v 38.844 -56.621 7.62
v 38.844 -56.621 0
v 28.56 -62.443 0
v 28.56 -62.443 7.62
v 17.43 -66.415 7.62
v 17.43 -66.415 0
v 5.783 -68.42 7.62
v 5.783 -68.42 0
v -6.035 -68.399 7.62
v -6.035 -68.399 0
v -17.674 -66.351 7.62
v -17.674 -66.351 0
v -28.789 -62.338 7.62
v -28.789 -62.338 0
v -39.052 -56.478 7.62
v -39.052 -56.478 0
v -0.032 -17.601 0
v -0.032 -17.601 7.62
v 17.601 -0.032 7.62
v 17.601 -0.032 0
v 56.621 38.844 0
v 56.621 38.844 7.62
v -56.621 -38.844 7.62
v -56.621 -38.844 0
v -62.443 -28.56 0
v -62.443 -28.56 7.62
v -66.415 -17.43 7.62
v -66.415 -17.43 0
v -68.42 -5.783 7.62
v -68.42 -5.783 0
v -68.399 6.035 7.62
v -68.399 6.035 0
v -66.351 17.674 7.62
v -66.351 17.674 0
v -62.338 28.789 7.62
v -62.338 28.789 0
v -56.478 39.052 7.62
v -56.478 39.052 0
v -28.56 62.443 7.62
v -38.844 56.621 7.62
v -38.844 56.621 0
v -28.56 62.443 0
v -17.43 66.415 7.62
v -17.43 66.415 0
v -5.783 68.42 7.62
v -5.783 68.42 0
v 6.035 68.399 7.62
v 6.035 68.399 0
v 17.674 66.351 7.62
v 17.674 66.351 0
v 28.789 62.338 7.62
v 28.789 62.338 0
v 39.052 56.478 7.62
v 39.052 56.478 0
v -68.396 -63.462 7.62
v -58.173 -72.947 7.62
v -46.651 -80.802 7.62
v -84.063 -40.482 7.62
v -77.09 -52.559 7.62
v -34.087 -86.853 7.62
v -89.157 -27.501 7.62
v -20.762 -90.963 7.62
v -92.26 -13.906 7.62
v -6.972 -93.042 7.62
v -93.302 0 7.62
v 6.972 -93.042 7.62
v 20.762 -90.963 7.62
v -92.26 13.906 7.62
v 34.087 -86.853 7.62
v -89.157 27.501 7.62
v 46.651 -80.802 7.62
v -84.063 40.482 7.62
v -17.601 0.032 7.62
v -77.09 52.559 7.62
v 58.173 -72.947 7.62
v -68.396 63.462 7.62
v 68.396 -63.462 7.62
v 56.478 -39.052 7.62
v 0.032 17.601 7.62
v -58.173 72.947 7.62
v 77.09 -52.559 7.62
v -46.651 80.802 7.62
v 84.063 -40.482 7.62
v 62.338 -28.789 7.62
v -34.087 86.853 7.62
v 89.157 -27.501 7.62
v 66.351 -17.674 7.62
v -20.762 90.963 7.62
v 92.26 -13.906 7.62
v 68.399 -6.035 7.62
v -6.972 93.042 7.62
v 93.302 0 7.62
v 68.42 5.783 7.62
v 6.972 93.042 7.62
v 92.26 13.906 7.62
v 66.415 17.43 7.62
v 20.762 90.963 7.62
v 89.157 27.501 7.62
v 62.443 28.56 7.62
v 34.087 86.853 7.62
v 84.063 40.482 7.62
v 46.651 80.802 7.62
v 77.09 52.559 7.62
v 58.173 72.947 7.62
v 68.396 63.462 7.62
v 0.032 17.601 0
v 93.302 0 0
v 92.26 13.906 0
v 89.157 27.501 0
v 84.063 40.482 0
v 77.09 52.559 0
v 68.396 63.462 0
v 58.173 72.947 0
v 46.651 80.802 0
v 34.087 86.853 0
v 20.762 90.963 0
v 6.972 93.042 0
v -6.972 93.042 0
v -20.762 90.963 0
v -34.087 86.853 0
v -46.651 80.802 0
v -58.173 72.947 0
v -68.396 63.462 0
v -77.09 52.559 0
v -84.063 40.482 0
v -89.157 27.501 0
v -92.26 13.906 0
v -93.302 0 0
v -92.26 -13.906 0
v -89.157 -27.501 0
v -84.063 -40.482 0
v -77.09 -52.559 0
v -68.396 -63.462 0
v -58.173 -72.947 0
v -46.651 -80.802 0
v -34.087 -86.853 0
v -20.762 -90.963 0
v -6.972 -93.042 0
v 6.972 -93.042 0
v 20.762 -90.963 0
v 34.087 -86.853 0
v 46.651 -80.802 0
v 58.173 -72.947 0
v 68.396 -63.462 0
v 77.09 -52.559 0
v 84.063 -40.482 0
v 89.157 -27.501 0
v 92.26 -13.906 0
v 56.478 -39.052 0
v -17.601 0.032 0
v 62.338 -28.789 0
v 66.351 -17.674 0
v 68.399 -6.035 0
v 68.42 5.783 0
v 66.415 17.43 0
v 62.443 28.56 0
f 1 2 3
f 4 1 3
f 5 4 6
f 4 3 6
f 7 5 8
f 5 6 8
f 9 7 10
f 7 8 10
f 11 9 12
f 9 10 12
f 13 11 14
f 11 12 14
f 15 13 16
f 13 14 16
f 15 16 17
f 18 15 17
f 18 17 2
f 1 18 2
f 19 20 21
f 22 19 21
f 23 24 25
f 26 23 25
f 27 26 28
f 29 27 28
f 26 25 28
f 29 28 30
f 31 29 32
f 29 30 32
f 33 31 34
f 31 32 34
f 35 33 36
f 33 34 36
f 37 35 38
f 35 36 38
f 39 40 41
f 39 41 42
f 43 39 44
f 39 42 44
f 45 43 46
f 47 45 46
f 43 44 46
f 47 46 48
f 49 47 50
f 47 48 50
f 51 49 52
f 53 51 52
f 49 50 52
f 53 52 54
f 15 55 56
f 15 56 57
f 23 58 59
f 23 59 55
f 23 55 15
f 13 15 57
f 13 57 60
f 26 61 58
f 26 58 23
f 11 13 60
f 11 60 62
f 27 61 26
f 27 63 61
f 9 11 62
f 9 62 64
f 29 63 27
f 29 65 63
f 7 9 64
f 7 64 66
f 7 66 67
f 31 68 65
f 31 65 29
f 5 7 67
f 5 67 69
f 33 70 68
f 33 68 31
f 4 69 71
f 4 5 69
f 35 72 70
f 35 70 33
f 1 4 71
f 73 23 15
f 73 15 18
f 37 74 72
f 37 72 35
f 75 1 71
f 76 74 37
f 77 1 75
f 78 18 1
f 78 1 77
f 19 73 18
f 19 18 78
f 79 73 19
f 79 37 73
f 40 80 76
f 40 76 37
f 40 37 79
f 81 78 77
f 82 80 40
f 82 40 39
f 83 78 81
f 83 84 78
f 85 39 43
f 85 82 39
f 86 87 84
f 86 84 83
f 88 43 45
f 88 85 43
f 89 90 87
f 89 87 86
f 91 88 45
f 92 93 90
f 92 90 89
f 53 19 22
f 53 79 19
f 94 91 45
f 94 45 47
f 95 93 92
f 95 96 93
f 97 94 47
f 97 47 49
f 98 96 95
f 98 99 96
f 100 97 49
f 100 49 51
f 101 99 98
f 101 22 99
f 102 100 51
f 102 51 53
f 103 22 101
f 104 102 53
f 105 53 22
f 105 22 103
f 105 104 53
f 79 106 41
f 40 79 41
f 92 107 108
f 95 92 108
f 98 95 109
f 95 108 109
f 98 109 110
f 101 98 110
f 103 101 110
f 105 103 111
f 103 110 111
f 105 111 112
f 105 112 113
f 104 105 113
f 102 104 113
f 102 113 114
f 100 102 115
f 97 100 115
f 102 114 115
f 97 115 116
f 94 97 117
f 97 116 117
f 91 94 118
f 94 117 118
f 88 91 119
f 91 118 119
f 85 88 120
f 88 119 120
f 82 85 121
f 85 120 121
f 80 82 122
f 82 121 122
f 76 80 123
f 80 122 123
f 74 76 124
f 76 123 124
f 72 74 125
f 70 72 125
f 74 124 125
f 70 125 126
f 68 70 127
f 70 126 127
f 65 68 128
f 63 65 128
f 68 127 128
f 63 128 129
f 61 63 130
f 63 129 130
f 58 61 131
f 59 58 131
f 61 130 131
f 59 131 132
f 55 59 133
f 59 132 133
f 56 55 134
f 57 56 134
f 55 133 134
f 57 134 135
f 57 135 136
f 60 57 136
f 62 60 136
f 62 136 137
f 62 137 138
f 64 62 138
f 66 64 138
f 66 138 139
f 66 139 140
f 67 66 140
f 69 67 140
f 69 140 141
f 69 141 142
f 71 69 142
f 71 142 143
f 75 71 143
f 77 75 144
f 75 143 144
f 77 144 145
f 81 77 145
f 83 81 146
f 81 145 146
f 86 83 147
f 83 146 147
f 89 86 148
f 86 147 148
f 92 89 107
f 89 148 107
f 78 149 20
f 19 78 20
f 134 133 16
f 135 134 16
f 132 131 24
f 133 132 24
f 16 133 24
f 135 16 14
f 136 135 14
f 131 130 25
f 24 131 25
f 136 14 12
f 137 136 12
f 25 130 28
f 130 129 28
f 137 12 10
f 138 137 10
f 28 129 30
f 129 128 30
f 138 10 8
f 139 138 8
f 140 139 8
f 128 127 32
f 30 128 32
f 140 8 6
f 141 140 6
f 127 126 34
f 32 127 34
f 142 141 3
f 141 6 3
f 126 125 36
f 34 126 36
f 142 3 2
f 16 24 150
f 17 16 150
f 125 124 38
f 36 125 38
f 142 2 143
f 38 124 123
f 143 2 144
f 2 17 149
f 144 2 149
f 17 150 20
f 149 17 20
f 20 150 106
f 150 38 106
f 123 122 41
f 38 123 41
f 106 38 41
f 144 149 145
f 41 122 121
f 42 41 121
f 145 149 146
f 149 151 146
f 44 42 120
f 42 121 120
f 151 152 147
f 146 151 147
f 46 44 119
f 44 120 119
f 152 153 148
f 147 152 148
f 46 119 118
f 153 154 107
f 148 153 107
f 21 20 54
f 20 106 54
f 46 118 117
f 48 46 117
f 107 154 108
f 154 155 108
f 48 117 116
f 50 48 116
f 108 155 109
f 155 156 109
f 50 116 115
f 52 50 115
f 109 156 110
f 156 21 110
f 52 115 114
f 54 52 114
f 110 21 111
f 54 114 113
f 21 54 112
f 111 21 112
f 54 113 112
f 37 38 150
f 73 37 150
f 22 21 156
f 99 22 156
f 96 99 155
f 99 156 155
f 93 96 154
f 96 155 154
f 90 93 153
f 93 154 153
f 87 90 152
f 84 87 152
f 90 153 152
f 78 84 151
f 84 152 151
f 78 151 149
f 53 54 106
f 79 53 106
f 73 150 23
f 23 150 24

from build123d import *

# Parameters (mm, degrees)
F0_R     = 93.302436173
F1_DEPTH = 7.62


# Not quite as in the source:
# - ends of sketch curves that miss each other by under 0.0002 mm in the source are joined


with BuildPart() as f1:
    # F0 (on Top) → F1 (new body)
    with BuildSketch(Plane.XY):
        Circle(F0_R)
        with BuildLine():
            Line((-39.0521280378, -56.4777448198), (-0.032374081, -17.6012715653))
            Line((-0.032374081, -17.6012715653), (38.8440970553, -56.6210251423))
            ThreePointArc((38.8440970553, -56.6210251423), (-0.1262993869, -68.6643168805), (-39.0521280378, -56.4777448198))
        make_face(mode=Mode.SUBTRACT)
        with BuildLine():
            Line((56.477744538, -39.0521284453), (17.6012712801, -0.0323744851))
            Line((17.6012712801, -0.0323744851), (56.6210244822, 38.8440980175))
            ThreePointArc((56.6210244822, 38.8440980175), (68.6643168811, -0.1262990512), (56.477744538, -39.0521284453))
        make_face(mode=Mode.SUBTRACT)
        with BuildLine():
            ThreePointArc((-56.6210254, -38.8440966797), (-68.6643168783, 0.1263005725), (-56.4777437302, 39.0521296136))
            Line((-56.4777437302, 39.0521296136), (-17.6012714166, 0.0323766012))
            Line((-17.6012714166, 0.0323766012), (-56.6210254, -38.8440966797))
        make_face(mode=Mode.SUBTRACT)
        with BuildLine():
            Line((39.0521279012, 56.4777449142), (0.0323739658, 17.601271681))
            Line((0.0323739658, 17.601271681), (-38.8440980887, 56.6210244334))
            ThreePointArc((-38.8440980887, 56.6210244334), (0.1262986773, 68.6643168818), (39.0521279012, 56.4777449142))
        make_face(mode=Mode.SUBTRACT)
    extrude(amount=F1_DEPTH)


solid = f1.part
